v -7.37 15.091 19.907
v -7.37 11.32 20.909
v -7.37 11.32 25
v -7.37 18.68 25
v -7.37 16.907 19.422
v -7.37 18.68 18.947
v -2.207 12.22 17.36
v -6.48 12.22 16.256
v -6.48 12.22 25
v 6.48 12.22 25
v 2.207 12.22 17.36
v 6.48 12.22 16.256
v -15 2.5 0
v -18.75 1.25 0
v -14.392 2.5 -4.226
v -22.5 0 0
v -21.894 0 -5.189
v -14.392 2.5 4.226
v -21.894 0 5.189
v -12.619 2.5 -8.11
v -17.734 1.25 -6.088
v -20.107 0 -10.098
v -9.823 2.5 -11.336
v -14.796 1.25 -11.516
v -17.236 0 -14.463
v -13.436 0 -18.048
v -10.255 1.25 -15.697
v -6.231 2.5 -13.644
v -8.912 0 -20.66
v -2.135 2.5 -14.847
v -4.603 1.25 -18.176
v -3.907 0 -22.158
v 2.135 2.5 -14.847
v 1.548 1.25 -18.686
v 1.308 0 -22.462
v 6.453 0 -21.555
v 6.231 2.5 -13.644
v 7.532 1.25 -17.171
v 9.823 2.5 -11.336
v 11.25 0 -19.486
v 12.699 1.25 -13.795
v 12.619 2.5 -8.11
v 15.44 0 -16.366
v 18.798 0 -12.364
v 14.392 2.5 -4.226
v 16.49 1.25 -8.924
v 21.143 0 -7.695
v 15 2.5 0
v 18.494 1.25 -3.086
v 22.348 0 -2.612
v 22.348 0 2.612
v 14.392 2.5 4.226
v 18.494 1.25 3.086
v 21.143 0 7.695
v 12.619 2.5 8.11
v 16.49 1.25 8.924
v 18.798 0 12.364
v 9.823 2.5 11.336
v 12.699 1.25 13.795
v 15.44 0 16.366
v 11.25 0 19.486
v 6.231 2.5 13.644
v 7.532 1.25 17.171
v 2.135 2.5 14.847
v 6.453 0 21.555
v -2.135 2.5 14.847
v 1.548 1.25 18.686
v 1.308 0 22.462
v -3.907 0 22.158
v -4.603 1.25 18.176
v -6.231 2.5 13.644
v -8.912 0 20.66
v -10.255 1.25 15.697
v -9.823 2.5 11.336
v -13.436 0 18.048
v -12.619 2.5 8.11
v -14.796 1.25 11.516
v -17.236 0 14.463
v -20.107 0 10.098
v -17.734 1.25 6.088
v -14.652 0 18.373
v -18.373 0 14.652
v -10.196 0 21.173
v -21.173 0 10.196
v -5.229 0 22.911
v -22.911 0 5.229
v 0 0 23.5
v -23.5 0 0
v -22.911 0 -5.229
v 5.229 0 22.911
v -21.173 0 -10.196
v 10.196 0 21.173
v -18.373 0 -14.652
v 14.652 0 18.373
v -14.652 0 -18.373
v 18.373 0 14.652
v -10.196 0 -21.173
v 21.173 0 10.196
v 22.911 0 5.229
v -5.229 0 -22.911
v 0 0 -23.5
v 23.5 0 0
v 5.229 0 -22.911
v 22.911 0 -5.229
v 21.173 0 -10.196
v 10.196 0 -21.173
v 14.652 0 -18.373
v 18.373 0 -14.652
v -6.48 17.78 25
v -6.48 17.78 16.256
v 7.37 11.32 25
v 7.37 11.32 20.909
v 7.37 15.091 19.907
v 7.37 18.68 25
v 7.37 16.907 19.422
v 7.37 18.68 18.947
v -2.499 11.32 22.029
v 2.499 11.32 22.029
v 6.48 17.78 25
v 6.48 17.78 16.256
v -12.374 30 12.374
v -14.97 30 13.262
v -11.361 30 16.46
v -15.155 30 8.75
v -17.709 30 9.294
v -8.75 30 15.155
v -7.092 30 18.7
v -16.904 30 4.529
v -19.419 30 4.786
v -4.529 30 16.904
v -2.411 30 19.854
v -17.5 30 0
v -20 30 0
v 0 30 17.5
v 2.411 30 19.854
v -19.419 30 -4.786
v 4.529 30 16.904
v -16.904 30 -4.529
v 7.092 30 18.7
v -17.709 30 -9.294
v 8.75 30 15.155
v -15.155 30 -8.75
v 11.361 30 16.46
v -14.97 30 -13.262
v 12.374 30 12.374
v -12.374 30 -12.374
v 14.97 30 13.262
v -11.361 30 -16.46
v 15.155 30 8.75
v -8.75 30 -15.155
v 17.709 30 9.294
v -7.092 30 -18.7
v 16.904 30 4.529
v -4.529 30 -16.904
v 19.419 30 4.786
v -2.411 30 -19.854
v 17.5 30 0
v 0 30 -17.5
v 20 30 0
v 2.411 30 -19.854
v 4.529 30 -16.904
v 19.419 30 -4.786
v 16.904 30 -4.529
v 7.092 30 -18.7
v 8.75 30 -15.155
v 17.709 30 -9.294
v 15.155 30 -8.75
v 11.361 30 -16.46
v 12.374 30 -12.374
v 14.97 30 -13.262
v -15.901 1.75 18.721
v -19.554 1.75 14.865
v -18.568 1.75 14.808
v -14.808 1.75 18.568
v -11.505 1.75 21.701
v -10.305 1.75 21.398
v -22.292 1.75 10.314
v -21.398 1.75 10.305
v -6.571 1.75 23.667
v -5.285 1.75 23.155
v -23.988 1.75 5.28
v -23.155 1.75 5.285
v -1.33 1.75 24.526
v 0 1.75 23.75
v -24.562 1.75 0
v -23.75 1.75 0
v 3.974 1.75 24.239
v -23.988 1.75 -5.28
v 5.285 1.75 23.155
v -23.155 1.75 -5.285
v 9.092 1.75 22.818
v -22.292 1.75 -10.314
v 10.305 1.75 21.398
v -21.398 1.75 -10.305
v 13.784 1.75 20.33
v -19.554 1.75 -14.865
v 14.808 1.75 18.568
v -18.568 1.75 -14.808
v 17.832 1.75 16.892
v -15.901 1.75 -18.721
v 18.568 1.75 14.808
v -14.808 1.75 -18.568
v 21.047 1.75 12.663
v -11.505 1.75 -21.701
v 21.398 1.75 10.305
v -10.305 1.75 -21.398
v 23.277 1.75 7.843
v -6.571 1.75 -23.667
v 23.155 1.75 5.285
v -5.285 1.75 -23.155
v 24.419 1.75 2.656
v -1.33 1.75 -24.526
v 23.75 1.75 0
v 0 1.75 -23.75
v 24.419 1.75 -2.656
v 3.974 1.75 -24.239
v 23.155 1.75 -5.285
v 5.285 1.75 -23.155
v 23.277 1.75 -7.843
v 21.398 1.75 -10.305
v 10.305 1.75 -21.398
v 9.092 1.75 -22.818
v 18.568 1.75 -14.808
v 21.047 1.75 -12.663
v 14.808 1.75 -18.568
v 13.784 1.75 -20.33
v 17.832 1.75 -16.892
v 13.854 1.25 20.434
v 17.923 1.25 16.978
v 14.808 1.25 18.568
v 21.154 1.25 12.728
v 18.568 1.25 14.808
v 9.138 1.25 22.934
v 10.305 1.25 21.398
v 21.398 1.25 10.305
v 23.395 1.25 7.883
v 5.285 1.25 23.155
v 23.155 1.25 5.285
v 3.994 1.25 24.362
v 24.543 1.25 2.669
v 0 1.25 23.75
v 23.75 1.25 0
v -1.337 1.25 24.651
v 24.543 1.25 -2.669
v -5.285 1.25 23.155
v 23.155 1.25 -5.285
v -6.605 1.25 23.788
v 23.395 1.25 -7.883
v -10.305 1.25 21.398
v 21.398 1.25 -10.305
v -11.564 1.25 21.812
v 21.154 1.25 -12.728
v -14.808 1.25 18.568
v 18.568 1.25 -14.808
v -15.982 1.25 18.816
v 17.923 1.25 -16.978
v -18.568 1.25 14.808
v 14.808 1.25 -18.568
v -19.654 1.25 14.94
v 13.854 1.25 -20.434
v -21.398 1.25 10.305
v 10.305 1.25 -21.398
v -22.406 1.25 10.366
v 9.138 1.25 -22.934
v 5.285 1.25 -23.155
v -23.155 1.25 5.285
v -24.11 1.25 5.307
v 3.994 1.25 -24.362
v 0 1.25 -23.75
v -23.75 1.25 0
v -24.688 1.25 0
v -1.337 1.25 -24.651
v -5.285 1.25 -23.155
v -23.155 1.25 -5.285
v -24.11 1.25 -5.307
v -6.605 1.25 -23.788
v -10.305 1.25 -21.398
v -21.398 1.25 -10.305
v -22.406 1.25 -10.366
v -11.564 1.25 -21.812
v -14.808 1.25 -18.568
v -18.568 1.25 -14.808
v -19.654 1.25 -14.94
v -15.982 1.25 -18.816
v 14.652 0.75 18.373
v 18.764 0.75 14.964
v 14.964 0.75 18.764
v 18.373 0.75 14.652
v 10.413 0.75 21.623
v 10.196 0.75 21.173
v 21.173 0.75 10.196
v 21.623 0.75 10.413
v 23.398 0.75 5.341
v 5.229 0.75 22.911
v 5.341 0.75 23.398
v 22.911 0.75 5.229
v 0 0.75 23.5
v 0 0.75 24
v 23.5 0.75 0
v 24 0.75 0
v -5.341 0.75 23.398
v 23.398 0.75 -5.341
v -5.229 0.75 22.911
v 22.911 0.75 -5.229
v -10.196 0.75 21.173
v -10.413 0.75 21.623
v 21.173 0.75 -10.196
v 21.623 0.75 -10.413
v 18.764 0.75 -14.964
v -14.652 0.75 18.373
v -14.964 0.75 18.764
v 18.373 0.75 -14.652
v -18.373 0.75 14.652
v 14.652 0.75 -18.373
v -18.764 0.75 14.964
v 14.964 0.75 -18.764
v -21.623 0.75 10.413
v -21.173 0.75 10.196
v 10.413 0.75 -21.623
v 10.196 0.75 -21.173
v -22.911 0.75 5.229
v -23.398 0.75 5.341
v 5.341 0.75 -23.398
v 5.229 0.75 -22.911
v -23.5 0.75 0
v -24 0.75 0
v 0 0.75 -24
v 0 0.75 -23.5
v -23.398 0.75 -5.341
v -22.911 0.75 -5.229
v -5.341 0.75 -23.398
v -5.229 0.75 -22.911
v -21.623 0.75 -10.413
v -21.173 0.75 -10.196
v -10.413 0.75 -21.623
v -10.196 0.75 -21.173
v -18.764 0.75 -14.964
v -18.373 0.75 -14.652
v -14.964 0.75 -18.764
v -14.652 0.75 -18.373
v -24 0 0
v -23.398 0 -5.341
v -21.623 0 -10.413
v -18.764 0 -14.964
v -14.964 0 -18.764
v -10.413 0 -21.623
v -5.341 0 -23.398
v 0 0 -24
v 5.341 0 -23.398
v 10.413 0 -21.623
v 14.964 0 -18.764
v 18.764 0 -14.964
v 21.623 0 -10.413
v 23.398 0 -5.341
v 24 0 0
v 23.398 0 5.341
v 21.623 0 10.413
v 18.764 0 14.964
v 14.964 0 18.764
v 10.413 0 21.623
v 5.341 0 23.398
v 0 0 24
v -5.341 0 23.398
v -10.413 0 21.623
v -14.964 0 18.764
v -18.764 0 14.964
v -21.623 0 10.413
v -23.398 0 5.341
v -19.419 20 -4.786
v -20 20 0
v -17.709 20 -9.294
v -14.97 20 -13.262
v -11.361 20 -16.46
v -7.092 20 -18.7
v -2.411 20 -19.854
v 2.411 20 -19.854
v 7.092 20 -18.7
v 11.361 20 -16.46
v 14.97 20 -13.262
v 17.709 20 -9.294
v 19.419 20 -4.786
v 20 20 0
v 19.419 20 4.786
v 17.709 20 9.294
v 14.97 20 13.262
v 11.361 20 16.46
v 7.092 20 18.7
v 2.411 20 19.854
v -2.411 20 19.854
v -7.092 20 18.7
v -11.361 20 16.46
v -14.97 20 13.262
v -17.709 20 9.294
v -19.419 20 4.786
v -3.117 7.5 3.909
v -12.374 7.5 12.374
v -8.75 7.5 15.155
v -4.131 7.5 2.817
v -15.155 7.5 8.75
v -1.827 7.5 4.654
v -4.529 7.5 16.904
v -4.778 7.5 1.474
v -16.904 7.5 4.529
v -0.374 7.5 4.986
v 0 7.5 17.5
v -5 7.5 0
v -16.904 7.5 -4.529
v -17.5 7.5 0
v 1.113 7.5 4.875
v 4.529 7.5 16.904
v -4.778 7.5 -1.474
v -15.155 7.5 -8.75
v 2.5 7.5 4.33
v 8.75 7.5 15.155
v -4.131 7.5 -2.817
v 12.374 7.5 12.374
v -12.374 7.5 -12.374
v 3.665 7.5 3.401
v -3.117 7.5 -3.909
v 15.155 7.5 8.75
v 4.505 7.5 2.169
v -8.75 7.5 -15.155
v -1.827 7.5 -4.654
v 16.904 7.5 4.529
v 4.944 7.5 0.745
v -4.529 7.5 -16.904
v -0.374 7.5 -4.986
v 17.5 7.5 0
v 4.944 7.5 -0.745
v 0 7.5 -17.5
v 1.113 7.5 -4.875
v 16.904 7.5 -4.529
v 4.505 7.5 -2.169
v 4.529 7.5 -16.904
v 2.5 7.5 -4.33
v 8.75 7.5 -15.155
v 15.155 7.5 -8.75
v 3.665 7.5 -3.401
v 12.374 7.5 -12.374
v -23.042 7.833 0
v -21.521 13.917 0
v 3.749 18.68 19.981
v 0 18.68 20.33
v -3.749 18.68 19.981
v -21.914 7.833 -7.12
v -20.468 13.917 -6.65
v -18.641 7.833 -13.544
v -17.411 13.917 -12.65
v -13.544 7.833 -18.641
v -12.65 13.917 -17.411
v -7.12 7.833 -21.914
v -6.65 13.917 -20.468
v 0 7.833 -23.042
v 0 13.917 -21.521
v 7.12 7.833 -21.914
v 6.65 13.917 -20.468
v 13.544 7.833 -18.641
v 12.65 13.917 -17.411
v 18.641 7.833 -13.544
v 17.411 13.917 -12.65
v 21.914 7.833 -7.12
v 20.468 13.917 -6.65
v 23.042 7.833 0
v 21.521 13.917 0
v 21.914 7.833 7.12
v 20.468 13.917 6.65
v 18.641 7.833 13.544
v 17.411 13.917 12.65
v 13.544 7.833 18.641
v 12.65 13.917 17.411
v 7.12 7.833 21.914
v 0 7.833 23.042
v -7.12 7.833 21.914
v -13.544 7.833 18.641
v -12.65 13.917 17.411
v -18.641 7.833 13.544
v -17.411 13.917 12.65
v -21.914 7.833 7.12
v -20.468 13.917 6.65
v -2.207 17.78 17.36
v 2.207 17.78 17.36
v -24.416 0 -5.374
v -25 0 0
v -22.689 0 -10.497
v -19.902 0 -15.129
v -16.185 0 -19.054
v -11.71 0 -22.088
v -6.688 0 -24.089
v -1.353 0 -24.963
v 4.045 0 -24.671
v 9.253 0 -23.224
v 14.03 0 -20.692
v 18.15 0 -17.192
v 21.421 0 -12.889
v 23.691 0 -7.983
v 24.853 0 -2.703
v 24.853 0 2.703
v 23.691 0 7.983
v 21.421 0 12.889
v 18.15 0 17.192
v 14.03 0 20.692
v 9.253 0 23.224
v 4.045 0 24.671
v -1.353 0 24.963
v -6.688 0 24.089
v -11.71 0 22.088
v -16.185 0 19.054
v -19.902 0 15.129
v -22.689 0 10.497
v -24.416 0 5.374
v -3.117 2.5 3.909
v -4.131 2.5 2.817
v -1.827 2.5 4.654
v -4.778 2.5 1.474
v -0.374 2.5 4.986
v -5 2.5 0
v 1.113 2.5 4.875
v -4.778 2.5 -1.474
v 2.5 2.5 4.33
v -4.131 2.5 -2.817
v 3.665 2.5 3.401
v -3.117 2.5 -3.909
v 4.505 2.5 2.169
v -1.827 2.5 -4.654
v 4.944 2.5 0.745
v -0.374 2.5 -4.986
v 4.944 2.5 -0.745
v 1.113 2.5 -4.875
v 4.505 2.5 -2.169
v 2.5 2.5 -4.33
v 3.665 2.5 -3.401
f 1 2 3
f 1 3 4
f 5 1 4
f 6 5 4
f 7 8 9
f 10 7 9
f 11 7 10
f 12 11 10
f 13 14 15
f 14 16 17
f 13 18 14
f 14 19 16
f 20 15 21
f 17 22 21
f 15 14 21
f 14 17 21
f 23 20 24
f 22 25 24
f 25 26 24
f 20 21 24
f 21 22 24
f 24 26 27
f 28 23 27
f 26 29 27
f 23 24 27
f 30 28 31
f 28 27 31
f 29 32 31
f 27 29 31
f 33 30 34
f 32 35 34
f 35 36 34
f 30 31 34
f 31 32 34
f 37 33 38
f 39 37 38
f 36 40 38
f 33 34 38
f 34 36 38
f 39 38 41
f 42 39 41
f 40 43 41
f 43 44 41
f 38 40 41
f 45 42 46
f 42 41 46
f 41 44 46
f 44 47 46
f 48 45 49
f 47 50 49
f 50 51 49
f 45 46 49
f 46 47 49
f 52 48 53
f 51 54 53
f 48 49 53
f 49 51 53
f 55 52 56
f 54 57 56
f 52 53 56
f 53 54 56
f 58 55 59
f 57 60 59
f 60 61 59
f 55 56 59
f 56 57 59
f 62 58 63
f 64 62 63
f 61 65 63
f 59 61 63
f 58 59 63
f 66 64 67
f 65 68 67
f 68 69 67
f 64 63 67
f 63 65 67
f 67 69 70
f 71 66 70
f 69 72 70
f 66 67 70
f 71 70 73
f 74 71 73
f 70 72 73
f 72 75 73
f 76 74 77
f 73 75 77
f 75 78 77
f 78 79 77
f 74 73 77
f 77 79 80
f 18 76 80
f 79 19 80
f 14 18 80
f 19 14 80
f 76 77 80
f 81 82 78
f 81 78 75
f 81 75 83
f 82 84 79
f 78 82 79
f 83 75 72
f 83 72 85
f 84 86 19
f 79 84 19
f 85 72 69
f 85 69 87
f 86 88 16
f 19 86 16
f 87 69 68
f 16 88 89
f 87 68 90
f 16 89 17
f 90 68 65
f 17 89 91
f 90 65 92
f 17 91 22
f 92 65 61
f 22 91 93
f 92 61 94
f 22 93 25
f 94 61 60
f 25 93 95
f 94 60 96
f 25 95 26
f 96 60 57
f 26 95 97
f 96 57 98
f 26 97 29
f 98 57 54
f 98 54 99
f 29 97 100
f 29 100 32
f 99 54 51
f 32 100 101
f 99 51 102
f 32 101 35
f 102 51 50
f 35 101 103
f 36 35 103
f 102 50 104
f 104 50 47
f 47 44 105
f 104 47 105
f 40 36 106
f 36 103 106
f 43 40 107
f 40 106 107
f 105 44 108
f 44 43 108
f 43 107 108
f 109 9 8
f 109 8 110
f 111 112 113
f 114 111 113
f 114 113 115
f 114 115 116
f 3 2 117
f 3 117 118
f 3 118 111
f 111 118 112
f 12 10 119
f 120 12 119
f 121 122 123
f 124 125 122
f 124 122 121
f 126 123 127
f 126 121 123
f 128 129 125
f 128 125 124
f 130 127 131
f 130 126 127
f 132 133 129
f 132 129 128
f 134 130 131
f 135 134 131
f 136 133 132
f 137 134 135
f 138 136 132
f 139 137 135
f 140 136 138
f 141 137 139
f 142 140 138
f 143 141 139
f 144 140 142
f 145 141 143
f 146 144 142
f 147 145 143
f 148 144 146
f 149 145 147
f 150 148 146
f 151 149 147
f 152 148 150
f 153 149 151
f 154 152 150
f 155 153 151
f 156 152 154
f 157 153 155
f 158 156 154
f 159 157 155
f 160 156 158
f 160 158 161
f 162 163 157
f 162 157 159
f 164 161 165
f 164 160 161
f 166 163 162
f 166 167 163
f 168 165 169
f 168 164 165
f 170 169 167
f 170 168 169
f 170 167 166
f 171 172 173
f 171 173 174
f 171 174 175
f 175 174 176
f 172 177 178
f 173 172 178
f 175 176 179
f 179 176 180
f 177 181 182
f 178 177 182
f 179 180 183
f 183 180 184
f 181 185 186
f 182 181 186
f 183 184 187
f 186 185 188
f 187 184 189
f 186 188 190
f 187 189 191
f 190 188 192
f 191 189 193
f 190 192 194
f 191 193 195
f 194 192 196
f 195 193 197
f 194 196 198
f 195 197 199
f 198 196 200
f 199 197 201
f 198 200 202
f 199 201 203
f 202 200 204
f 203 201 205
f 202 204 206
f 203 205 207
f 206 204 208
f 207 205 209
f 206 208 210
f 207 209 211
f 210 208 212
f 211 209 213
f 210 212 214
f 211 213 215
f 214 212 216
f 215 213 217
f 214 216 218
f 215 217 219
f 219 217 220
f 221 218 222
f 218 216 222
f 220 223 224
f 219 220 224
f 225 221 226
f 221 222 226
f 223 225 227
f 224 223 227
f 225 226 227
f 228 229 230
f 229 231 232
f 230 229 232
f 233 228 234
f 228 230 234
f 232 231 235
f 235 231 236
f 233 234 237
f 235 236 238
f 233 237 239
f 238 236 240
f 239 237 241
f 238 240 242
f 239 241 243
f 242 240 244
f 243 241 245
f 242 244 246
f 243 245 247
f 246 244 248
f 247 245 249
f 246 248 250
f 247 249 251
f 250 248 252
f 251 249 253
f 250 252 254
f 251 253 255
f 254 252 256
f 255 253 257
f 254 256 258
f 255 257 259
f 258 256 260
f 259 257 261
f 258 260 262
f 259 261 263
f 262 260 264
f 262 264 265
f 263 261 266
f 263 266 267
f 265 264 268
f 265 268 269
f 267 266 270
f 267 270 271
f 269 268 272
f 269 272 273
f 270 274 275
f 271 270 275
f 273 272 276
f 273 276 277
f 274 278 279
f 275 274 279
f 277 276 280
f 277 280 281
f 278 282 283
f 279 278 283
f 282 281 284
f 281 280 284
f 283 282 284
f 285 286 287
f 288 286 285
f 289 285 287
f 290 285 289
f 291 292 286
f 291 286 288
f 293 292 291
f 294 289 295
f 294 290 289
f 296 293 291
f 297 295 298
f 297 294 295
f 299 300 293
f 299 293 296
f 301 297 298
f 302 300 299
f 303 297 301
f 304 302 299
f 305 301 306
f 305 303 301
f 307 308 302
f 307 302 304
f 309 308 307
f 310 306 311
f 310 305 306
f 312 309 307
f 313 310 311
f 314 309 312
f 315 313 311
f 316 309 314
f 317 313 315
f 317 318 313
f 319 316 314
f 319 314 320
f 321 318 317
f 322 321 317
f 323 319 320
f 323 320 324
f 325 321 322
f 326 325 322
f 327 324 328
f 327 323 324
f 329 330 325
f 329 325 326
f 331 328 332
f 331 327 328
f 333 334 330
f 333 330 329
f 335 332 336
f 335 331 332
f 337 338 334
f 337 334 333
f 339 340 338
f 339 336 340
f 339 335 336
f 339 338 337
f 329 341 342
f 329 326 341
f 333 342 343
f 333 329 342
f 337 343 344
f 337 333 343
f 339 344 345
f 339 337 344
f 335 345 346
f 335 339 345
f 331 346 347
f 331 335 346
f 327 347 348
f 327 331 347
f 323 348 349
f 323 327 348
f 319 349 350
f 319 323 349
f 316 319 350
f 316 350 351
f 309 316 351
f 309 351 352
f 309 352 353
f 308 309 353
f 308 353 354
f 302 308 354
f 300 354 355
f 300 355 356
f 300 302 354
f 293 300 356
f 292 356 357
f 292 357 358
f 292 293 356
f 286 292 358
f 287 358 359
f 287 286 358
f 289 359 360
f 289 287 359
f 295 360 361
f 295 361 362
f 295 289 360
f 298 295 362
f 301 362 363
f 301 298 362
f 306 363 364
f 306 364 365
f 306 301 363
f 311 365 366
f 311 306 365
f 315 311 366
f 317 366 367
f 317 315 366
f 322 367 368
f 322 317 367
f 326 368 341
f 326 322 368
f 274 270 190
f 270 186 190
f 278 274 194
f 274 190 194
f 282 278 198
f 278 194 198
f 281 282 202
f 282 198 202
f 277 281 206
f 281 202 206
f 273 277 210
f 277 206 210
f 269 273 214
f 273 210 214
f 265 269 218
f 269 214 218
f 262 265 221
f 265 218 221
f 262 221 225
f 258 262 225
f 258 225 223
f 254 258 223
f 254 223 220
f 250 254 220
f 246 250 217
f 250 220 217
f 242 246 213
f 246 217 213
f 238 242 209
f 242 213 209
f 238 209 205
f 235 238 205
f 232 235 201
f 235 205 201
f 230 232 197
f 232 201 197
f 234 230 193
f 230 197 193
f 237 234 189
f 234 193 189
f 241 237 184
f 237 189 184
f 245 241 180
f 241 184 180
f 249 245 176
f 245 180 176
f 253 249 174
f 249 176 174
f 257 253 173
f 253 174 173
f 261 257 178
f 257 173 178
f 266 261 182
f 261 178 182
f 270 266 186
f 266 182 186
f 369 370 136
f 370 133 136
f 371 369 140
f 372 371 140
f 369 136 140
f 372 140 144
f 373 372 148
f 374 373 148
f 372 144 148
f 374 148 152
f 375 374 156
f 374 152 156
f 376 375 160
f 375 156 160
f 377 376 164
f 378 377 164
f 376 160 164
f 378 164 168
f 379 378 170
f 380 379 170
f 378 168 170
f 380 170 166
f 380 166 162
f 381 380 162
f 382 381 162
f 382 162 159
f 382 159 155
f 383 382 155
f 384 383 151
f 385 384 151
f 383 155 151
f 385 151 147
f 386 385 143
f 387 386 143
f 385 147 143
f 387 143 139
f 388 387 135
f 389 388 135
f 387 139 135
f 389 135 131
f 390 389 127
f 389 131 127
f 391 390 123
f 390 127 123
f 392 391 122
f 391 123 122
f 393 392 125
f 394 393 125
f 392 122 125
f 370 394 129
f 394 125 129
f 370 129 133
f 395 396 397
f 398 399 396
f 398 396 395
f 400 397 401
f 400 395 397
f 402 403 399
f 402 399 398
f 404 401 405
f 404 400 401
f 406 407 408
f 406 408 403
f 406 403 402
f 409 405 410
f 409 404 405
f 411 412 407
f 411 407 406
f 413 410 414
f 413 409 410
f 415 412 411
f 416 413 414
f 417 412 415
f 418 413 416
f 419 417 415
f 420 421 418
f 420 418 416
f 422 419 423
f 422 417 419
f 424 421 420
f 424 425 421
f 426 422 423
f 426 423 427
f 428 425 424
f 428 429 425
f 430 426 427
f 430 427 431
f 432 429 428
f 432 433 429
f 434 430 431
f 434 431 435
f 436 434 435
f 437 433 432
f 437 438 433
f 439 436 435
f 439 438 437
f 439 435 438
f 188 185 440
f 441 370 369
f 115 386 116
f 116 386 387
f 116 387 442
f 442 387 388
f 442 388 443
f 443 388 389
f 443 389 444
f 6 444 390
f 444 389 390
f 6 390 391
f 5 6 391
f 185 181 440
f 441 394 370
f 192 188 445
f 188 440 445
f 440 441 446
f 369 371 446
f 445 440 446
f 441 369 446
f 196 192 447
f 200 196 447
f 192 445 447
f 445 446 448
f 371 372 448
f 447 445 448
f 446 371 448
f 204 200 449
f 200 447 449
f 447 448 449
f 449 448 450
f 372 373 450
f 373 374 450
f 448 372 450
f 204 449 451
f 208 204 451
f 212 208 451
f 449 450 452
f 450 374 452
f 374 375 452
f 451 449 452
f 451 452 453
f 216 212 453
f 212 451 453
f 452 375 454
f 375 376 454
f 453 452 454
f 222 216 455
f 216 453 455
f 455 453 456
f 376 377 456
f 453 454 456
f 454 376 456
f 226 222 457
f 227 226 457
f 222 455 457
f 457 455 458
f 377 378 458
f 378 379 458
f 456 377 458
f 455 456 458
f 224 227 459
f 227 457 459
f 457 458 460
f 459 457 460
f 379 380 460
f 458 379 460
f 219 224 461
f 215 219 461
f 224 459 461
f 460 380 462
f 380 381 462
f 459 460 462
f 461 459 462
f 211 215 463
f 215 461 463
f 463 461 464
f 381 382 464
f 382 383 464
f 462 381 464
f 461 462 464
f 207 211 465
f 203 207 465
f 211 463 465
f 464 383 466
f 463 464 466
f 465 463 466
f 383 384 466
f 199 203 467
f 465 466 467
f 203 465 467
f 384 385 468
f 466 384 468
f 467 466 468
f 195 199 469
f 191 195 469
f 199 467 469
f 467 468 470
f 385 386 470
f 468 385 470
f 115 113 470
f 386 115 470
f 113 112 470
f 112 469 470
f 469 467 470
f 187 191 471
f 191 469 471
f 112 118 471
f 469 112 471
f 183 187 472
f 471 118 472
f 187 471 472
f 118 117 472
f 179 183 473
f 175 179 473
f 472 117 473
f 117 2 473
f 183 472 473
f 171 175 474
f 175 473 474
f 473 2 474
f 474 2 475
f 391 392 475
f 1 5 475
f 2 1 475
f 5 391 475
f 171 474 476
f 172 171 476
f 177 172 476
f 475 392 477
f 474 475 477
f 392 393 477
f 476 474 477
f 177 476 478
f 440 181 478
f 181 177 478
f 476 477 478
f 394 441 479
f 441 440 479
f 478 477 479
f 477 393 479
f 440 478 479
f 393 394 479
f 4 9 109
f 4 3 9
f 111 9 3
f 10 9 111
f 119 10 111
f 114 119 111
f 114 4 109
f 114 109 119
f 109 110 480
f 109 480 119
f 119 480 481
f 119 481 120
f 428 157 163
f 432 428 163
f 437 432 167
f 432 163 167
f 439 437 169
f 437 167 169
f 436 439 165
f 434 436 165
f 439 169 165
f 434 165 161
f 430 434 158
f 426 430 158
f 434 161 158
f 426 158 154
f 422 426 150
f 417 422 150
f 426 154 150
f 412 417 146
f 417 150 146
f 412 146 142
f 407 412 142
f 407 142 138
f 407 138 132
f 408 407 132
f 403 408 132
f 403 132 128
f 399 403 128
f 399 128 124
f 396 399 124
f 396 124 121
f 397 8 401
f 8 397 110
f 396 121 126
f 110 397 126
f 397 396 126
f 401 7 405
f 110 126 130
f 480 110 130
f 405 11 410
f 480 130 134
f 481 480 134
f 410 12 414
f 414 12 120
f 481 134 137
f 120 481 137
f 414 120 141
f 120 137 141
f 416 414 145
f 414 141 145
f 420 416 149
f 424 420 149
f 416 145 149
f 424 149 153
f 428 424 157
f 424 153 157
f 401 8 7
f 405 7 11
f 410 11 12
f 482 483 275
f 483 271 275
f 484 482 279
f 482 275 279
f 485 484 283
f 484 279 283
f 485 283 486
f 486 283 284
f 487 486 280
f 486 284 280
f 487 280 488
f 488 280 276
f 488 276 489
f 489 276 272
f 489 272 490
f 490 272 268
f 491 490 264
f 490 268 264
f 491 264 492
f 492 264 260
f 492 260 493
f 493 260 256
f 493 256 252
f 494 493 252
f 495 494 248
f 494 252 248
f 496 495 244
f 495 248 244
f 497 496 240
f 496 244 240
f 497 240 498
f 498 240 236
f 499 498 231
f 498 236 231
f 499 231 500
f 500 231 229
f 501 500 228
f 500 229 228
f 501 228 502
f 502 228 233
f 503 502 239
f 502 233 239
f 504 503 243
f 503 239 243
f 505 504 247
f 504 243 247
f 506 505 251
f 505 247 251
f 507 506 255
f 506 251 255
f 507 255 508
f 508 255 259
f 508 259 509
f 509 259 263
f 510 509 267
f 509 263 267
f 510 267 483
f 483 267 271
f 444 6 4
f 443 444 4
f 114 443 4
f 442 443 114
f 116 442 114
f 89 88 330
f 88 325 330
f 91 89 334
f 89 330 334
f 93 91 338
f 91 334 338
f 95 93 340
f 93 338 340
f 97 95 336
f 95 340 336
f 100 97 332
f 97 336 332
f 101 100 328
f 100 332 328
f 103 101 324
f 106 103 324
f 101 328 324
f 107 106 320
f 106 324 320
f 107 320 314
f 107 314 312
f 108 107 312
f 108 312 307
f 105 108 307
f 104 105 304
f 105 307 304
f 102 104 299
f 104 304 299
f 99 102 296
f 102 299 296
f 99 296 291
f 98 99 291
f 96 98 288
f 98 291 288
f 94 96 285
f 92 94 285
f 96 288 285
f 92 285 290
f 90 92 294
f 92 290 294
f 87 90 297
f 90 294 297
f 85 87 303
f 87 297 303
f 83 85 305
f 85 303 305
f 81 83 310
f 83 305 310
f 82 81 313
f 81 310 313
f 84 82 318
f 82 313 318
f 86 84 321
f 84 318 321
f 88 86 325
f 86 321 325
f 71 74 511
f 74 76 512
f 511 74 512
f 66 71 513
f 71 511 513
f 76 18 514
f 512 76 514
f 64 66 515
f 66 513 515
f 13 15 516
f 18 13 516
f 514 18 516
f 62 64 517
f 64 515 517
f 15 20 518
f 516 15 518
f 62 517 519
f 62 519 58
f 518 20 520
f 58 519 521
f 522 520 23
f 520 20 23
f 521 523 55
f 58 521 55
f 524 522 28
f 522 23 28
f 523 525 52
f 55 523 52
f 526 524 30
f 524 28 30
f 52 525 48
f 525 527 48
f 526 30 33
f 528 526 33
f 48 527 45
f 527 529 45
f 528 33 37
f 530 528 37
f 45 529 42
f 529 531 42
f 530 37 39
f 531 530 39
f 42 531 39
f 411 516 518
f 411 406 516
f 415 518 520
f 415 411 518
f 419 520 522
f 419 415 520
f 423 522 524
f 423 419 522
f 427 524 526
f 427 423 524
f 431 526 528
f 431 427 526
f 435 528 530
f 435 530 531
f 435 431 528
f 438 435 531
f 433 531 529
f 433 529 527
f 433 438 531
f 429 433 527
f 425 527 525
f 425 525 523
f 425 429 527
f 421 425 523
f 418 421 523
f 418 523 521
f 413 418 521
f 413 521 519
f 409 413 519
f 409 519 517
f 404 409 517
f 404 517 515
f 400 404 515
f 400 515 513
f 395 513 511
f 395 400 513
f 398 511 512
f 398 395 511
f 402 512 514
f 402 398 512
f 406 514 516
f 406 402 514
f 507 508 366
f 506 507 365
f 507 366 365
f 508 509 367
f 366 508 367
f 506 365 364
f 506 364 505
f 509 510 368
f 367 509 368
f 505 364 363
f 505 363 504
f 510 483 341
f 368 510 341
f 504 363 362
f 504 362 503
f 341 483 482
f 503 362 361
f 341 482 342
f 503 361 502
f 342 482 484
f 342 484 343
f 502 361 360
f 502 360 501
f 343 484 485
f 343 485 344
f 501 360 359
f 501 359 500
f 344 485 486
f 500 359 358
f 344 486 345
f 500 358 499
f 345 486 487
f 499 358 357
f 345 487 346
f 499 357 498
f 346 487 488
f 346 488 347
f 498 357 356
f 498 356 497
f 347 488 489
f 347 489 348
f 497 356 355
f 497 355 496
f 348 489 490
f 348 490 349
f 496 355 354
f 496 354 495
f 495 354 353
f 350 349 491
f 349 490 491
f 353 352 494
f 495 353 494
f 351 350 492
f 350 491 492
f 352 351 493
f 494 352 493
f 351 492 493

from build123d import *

# Parameters (mm, degrees)
SKETCH1_R           = 25
BOSS_EXTRUDE1_DEPTH = 30
SKETCH3_W           = 0.5
SKETCH3_H           = 0.75
SKETCH6_W           = 14.74
SKETCH6_H           = 7.36
SKETCH6_W_2         = 12.96
SKETCH6_H_2         = 5.56
BOSS_EXTRUDE2_DEPTH = 25
SKETCH4_R           = 17.5
CUT_EXTRUDE1_DEPTH  = 22.5
SKETCH6_5_W         = 12.96
SKETCH6_5_H         = 5.56
CUT_EXTRUDE7_DEPTH  = 46.5


with BuildPart() as part:
    # Sketch1 → Boss-Extrude1 (new body)
    with BuildSketch(Plane(origin=(0, 0, 0), x_dir=(1, 0, 0), z_dir=(0, 1, 0))):
        Circle(SKETCH1_R)
    extrude(amount=BOSS_EXTRUDE1_DEPTH)

    # Sketch3 → Cut-Revolve1 (revolve, cut)
    with BuildSketch(Plane.XY):
        Polygon((-24.5625, 1.75), (-20, 20), (-20, 30), (-25, 30), (-25, 0), (-24.6875, 1.25), (-23.75, 1.25), (-23.75, 1.75), align=None)
        Polygon((0, 0), (0, 20), (-5, 20), (-5, 2.5), (-15, 2.5), (-22.5, 0), align=None)
        with Locations((-23.75, 0.375)):
            Rectangle(SKETCH3_W, SKETCH3_H)
    revolve(axis=Axis((0, 31.461521879, 0), (0, -1, 0)), mode=Mode.SUBTRACT)

    # Sketch6 → Boss-Extrude2 (add)
    with BuildSketch(Plane.XY):
        with Locations((0, 15)):
            Rectangle(SKETCH6_W, SKETCH6_H)
        with Locations((0, 15)):
            Rectangle(SKETCH6_W_2, SKETCH6_H_2, mode=Mode.SUBTRACT)
    extrude(amount=BOSS_EXTRUDE2_DEPTH)

    # Sketch4 → Cut-Extrude1 (cut)
    with BuildSketch(Plane(origin=(0, 30, 0), x_dir=(1, 0, 0), z_dir=(0, 1, 0))):
        Circle(SKETCH4_R)
    extrude(amount=-CUT_EXTRUDE1_DEPTH, mode=Mode.SUBTRACT)

    # Sketch6<5> → Cut-Extrude7 (cut)
    with BuildSketch(Plane.XY):
        with Locations((0, 15)):
            Rectangle(SKETCH6_5_W, SKETCH6_5_H)
    extrude(amount=CUT_EXTRUDE7_DEPTH, mode=Mode.SUBTRACT)


solid = part.part
